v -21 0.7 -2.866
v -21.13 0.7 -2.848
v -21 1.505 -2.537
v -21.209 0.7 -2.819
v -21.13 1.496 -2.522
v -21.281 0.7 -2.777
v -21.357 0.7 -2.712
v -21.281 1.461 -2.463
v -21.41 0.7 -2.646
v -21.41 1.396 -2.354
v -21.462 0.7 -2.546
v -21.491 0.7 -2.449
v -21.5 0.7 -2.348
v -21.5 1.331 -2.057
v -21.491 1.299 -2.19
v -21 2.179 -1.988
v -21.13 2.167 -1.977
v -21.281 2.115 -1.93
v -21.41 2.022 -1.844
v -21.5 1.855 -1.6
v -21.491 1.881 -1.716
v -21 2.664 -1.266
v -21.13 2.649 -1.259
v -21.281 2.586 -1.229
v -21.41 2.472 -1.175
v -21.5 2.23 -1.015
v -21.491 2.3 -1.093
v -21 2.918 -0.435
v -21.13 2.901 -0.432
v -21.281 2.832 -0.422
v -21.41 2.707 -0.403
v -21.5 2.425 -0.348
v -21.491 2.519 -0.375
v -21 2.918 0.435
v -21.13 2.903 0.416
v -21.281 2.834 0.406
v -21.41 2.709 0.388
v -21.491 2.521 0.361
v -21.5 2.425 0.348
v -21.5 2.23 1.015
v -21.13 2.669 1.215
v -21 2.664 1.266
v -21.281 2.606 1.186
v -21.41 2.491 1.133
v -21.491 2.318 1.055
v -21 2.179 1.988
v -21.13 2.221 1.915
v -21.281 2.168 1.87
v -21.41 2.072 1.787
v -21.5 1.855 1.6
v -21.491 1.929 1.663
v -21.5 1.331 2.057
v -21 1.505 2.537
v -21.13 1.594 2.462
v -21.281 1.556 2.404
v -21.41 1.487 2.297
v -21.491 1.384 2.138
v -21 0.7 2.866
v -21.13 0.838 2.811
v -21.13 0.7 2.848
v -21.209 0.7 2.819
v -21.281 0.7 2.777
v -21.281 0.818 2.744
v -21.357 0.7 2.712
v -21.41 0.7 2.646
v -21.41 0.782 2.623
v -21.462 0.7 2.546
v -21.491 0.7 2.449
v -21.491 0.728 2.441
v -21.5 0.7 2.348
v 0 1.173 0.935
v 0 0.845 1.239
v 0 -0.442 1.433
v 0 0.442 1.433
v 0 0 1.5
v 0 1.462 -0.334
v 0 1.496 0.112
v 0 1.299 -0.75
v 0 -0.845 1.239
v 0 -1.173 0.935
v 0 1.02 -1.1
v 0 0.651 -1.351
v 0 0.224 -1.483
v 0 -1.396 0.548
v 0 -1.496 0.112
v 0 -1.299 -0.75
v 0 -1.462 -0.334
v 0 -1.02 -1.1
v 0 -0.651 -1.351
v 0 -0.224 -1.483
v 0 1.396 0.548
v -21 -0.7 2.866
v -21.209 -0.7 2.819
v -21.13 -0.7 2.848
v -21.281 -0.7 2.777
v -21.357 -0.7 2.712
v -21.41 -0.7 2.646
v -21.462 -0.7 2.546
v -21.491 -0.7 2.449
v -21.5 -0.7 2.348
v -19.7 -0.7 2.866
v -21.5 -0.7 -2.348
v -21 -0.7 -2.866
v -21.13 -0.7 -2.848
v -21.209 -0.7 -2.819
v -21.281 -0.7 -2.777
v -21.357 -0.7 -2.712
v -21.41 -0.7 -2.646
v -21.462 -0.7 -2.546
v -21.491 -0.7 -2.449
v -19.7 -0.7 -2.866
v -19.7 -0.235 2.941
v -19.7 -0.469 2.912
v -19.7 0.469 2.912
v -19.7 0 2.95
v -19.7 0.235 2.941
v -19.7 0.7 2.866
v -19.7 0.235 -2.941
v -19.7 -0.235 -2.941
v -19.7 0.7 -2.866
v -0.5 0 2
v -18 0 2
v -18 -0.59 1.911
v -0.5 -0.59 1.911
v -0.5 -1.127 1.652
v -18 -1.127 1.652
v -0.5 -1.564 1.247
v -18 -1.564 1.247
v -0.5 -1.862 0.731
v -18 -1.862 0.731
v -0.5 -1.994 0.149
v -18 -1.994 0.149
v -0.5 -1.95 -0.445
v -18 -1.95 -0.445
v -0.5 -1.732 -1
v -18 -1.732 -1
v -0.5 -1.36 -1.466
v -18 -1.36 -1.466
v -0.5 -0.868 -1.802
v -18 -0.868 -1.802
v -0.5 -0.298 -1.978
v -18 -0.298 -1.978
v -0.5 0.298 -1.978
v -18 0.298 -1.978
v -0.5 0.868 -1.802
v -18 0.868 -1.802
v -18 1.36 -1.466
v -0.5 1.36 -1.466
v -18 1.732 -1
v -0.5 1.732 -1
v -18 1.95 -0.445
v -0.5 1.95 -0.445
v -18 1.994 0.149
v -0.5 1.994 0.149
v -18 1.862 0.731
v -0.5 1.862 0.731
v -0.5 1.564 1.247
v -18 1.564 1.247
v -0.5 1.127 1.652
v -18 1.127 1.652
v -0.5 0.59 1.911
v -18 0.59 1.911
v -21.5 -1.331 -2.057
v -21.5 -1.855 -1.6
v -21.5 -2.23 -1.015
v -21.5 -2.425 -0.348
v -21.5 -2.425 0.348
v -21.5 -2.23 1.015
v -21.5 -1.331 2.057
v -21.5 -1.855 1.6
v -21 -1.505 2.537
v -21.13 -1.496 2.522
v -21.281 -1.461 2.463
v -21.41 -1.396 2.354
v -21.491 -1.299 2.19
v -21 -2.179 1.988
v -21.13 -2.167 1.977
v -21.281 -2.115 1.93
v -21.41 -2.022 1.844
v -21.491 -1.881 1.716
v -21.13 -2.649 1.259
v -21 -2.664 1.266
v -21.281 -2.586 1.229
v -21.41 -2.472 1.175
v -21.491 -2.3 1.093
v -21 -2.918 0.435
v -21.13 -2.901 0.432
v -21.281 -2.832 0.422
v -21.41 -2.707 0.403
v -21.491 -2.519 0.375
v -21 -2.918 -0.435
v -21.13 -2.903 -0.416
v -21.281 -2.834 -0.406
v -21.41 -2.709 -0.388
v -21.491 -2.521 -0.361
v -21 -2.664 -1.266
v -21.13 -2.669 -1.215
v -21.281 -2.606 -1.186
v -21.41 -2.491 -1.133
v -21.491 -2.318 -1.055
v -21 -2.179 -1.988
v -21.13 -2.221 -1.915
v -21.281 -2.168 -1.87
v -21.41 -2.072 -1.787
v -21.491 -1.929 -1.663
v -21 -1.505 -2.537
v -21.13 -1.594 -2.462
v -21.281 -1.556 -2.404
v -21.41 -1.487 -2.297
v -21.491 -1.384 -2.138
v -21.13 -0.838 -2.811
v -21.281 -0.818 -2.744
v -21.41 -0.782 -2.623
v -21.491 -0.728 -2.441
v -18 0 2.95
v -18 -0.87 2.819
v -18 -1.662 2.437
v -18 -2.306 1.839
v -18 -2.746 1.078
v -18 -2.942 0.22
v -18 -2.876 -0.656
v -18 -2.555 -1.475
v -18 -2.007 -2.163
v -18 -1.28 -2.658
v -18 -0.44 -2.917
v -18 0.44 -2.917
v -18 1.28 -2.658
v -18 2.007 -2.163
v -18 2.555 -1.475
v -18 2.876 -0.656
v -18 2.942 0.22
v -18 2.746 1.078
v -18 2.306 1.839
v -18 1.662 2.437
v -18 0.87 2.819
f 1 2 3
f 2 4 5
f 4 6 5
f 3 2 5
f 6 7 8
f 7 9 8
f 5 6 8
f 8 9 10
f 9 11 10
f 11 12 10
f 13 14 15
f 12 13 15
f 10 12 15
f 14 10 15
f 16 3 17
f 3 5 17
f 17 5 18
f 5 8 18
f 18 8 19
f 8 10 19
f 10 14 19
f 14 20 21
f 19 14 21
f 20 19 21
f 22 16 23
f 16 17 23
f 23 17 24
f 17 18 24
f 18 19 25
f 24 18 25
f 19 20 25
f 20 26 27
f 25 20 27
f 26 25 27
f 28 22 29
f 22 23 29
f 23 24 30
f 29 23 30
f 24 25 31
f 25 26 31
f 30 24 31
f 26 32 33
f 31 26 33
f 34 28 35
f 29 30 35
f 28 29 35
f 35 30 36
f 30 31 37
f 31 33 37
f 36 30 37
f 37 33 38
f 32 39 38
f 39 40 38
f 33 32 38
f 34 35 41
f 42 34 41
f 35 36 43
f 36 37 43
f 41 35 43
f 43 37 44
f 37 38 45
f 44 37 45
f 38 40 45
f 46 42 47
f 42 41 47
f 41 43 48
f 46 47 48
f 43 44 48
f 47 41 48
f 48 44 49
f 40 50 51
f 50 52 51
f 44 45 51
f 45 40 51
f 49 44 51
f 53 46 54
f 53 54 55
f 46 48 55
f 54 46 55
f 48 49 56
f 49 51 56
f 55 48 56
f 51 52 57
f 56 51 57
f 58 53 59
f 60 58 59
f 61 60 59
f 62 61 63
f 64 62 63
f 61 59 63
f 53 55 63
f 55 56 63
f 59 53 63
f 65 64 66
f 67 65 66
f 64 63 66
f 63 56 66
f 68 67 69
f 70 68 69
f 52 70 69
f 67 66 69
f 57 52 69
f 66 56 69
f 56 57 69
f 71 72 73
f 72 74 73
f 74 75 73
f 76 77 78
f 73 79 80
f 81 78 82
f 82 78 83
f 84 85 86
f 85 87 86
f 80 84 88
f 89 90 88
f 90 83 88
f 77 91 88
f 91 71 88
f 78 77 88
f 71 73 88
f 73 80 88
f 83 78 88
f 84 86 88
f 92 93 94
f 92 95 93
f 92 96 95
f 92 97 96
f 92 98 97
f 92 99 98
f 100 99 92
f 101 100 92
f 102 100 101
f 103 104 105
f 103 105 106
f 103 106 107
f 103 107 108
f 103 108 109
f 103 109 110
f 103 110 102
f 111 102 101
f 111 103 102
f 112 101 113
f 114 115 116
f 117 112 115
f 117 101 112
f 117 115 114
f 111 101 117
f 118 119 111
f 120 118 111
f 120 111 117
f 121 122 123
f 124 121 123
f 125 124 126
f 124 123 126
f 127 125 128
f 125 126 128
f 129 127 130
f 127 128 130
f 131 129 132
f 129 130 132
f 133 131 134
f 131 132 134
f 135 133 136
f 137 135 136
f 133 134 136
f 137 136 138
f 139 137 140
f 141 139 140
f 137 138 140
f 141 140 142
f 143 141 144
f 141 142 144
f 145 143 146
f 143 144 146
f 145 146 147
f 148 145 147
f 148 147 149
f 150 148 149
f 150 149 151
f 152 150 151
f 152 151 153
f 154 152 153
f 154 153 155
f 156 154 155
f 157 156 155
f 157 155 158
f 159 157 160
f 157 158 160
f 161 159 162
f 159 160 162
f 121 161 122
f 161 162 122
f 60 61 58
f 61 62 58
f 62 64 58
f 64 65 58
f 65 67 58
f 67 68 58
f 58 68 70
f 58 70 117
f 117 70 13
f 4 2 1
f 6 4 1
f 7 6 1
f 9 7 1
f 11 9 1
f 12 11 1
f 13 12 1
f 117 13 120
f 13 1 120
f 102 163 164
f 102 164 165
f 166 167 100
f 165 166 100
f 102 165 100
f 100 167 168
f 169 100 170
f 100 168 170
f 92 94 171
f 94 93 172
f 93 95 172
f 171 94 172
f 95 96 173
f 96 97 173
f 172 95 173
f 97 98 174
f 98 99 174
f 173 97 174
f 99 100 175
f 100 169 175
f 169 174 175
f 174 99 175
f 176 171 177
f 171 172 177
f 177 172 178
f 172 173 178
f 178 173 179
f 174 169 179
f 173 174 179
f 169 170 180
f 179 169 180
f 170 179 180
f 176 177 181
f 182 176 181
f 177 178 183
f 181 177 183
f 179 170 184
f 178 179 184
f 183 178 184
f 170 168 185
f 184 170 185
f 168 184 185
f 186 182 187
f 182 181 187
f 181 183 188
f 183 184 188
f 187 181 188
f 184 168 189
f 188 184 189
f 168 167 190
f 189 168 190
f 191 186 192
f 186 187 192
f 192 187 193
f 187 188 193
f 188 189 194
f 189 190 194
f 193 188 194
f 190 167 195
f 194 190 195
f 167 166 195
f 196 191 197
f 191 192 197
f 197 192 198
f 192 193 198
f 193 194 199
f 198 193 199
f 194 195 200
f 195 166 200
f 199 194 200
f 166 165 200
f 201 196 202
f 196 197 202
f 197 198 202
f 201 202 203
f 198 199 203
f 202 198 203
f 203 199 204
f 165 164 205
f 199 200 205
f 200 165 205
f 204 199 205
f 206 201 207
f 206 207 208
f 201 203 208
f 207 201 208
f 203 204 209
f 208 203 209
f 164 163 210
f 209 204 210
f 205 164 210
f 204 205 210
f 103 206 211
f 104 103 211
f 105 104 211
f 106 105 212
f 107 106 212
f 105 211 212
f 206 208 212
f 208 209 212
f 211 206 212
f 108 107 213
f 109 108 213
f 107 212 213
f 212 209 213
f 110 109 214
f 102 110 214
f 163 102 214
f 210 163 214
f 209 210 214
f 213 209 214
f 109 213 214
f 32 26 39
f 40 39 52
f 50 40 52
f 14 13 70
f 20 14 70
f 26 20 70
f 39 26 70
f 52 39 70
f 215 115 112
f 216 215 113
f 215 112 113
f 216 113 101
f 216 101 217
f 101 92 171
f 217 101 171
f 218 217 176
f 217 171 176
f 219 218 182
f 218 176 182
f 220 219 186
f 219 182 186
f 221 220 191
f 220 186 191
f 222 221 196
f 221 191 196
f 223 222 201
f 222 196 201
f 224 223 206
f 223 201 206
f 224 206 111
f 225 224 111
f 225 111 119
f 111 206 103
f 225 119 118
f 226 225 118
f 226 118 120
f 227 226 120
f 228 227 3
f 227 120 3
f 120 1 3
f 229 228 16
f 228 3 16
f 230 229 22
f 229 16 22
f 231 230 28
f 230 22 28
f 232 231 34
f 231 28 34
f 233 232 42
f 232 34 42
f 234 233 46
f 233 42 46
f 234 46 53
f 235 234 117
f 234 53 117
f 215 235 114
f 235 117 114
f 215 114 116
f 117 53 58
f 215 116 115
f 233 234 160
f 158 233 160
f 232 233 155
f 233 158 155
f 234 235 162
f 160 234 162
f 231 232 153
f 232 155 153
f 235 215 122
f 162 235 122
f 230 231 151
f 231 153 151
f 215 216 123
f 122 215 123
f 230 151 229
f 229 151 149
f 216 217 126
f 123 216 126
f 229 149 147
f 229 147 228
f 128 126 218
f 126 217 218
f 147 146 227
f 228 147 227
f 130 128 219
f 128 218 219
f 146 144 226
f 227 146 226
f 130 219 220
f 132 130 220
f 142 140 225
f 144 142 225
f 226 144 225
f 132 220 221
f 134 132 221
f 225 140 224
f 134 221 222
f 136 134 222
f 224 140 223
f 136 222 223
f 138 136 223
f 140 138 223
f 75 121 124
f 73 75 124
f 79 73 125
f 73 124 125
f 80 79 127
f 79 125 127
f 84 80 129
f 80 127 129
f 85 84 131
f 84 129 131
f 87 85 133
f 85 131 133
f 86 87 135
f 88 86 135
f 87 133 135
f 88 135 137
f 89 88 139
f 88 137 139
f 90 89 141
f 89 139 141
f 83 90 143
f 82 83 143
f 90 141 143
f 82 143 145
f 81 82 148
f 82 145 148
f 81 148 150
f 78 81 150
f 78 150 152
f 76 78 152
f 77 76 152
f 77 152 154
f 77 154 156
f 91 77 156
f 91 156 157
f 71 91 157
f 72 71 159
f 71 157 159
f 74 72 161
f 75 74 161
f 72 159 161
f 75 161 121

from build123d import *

# Parameters (mm, degrees)
CHANFREIN1_SIZE              = 0.5
CONG_1_R                     = 0.5
ENL_V_MAT_EXTRU_1_DEPTH      = 22.901027373
ENL_V_MAT_EXTRU_1_DEPTH_BACK = 22.901027373
ESQUISSE2_W                  = 1.8
ESQUISSE2_H                  = 1.4


with BuildPart() as part:
    # Esquisse1 → Révolution1 (revolve)
    with BuildSketch(Plane.XY, mode=Mode.PRIVATE) as r_volution1_sk:
        Polygon((0, 0), (0, 2), (-18, 2), (-18, 2.95), (-21.5, 2.95), (-21.5, 0), align=None)
    revolve(r_volution1_sk.sketch.rotate(Axis((-6, 0, 0), (1, 0, 0)), 90), axis=Axis((-6, 0, 0), (1, 0, 0)))

    # Chanfrein1
    chanfrein1_edges = [part.edges().sort_by_distance(p)[0] for p in [
        (0, 0, -2),
    ]]
    chamfer(chanfrein1_edges, length=CHANFREIN1_SIZE)

    # Congé1
    cong_1_edges = [part.edges().sort_by_distance(p)[0] for p in [
        (-21.5, 0, -2.95),
    ]]
    fillet(cong_1_edges, radius=CONG_1_R)

    # Esquisse2 → Enlèv. mat.-Extru.1 (cut, two sides: drawn at the far end of the back side and taken through both)
    with BuildSketch(Plane.XY.offset(-ENL_V_MAT_EXTRU_1_DEPTH_BACK)):
        with Locations((-20.6, 0)):
            Rectangle(ESQUISSE2_W, ESQUISSE2_H)
    extrude(amount=ENL_V_MAT_EXTRU_1_DEPTH + ENL_V_MAT_EXTRU_1_DEPTH_BACK, mode=Mode.SUBTRACT)


solid = part.part
